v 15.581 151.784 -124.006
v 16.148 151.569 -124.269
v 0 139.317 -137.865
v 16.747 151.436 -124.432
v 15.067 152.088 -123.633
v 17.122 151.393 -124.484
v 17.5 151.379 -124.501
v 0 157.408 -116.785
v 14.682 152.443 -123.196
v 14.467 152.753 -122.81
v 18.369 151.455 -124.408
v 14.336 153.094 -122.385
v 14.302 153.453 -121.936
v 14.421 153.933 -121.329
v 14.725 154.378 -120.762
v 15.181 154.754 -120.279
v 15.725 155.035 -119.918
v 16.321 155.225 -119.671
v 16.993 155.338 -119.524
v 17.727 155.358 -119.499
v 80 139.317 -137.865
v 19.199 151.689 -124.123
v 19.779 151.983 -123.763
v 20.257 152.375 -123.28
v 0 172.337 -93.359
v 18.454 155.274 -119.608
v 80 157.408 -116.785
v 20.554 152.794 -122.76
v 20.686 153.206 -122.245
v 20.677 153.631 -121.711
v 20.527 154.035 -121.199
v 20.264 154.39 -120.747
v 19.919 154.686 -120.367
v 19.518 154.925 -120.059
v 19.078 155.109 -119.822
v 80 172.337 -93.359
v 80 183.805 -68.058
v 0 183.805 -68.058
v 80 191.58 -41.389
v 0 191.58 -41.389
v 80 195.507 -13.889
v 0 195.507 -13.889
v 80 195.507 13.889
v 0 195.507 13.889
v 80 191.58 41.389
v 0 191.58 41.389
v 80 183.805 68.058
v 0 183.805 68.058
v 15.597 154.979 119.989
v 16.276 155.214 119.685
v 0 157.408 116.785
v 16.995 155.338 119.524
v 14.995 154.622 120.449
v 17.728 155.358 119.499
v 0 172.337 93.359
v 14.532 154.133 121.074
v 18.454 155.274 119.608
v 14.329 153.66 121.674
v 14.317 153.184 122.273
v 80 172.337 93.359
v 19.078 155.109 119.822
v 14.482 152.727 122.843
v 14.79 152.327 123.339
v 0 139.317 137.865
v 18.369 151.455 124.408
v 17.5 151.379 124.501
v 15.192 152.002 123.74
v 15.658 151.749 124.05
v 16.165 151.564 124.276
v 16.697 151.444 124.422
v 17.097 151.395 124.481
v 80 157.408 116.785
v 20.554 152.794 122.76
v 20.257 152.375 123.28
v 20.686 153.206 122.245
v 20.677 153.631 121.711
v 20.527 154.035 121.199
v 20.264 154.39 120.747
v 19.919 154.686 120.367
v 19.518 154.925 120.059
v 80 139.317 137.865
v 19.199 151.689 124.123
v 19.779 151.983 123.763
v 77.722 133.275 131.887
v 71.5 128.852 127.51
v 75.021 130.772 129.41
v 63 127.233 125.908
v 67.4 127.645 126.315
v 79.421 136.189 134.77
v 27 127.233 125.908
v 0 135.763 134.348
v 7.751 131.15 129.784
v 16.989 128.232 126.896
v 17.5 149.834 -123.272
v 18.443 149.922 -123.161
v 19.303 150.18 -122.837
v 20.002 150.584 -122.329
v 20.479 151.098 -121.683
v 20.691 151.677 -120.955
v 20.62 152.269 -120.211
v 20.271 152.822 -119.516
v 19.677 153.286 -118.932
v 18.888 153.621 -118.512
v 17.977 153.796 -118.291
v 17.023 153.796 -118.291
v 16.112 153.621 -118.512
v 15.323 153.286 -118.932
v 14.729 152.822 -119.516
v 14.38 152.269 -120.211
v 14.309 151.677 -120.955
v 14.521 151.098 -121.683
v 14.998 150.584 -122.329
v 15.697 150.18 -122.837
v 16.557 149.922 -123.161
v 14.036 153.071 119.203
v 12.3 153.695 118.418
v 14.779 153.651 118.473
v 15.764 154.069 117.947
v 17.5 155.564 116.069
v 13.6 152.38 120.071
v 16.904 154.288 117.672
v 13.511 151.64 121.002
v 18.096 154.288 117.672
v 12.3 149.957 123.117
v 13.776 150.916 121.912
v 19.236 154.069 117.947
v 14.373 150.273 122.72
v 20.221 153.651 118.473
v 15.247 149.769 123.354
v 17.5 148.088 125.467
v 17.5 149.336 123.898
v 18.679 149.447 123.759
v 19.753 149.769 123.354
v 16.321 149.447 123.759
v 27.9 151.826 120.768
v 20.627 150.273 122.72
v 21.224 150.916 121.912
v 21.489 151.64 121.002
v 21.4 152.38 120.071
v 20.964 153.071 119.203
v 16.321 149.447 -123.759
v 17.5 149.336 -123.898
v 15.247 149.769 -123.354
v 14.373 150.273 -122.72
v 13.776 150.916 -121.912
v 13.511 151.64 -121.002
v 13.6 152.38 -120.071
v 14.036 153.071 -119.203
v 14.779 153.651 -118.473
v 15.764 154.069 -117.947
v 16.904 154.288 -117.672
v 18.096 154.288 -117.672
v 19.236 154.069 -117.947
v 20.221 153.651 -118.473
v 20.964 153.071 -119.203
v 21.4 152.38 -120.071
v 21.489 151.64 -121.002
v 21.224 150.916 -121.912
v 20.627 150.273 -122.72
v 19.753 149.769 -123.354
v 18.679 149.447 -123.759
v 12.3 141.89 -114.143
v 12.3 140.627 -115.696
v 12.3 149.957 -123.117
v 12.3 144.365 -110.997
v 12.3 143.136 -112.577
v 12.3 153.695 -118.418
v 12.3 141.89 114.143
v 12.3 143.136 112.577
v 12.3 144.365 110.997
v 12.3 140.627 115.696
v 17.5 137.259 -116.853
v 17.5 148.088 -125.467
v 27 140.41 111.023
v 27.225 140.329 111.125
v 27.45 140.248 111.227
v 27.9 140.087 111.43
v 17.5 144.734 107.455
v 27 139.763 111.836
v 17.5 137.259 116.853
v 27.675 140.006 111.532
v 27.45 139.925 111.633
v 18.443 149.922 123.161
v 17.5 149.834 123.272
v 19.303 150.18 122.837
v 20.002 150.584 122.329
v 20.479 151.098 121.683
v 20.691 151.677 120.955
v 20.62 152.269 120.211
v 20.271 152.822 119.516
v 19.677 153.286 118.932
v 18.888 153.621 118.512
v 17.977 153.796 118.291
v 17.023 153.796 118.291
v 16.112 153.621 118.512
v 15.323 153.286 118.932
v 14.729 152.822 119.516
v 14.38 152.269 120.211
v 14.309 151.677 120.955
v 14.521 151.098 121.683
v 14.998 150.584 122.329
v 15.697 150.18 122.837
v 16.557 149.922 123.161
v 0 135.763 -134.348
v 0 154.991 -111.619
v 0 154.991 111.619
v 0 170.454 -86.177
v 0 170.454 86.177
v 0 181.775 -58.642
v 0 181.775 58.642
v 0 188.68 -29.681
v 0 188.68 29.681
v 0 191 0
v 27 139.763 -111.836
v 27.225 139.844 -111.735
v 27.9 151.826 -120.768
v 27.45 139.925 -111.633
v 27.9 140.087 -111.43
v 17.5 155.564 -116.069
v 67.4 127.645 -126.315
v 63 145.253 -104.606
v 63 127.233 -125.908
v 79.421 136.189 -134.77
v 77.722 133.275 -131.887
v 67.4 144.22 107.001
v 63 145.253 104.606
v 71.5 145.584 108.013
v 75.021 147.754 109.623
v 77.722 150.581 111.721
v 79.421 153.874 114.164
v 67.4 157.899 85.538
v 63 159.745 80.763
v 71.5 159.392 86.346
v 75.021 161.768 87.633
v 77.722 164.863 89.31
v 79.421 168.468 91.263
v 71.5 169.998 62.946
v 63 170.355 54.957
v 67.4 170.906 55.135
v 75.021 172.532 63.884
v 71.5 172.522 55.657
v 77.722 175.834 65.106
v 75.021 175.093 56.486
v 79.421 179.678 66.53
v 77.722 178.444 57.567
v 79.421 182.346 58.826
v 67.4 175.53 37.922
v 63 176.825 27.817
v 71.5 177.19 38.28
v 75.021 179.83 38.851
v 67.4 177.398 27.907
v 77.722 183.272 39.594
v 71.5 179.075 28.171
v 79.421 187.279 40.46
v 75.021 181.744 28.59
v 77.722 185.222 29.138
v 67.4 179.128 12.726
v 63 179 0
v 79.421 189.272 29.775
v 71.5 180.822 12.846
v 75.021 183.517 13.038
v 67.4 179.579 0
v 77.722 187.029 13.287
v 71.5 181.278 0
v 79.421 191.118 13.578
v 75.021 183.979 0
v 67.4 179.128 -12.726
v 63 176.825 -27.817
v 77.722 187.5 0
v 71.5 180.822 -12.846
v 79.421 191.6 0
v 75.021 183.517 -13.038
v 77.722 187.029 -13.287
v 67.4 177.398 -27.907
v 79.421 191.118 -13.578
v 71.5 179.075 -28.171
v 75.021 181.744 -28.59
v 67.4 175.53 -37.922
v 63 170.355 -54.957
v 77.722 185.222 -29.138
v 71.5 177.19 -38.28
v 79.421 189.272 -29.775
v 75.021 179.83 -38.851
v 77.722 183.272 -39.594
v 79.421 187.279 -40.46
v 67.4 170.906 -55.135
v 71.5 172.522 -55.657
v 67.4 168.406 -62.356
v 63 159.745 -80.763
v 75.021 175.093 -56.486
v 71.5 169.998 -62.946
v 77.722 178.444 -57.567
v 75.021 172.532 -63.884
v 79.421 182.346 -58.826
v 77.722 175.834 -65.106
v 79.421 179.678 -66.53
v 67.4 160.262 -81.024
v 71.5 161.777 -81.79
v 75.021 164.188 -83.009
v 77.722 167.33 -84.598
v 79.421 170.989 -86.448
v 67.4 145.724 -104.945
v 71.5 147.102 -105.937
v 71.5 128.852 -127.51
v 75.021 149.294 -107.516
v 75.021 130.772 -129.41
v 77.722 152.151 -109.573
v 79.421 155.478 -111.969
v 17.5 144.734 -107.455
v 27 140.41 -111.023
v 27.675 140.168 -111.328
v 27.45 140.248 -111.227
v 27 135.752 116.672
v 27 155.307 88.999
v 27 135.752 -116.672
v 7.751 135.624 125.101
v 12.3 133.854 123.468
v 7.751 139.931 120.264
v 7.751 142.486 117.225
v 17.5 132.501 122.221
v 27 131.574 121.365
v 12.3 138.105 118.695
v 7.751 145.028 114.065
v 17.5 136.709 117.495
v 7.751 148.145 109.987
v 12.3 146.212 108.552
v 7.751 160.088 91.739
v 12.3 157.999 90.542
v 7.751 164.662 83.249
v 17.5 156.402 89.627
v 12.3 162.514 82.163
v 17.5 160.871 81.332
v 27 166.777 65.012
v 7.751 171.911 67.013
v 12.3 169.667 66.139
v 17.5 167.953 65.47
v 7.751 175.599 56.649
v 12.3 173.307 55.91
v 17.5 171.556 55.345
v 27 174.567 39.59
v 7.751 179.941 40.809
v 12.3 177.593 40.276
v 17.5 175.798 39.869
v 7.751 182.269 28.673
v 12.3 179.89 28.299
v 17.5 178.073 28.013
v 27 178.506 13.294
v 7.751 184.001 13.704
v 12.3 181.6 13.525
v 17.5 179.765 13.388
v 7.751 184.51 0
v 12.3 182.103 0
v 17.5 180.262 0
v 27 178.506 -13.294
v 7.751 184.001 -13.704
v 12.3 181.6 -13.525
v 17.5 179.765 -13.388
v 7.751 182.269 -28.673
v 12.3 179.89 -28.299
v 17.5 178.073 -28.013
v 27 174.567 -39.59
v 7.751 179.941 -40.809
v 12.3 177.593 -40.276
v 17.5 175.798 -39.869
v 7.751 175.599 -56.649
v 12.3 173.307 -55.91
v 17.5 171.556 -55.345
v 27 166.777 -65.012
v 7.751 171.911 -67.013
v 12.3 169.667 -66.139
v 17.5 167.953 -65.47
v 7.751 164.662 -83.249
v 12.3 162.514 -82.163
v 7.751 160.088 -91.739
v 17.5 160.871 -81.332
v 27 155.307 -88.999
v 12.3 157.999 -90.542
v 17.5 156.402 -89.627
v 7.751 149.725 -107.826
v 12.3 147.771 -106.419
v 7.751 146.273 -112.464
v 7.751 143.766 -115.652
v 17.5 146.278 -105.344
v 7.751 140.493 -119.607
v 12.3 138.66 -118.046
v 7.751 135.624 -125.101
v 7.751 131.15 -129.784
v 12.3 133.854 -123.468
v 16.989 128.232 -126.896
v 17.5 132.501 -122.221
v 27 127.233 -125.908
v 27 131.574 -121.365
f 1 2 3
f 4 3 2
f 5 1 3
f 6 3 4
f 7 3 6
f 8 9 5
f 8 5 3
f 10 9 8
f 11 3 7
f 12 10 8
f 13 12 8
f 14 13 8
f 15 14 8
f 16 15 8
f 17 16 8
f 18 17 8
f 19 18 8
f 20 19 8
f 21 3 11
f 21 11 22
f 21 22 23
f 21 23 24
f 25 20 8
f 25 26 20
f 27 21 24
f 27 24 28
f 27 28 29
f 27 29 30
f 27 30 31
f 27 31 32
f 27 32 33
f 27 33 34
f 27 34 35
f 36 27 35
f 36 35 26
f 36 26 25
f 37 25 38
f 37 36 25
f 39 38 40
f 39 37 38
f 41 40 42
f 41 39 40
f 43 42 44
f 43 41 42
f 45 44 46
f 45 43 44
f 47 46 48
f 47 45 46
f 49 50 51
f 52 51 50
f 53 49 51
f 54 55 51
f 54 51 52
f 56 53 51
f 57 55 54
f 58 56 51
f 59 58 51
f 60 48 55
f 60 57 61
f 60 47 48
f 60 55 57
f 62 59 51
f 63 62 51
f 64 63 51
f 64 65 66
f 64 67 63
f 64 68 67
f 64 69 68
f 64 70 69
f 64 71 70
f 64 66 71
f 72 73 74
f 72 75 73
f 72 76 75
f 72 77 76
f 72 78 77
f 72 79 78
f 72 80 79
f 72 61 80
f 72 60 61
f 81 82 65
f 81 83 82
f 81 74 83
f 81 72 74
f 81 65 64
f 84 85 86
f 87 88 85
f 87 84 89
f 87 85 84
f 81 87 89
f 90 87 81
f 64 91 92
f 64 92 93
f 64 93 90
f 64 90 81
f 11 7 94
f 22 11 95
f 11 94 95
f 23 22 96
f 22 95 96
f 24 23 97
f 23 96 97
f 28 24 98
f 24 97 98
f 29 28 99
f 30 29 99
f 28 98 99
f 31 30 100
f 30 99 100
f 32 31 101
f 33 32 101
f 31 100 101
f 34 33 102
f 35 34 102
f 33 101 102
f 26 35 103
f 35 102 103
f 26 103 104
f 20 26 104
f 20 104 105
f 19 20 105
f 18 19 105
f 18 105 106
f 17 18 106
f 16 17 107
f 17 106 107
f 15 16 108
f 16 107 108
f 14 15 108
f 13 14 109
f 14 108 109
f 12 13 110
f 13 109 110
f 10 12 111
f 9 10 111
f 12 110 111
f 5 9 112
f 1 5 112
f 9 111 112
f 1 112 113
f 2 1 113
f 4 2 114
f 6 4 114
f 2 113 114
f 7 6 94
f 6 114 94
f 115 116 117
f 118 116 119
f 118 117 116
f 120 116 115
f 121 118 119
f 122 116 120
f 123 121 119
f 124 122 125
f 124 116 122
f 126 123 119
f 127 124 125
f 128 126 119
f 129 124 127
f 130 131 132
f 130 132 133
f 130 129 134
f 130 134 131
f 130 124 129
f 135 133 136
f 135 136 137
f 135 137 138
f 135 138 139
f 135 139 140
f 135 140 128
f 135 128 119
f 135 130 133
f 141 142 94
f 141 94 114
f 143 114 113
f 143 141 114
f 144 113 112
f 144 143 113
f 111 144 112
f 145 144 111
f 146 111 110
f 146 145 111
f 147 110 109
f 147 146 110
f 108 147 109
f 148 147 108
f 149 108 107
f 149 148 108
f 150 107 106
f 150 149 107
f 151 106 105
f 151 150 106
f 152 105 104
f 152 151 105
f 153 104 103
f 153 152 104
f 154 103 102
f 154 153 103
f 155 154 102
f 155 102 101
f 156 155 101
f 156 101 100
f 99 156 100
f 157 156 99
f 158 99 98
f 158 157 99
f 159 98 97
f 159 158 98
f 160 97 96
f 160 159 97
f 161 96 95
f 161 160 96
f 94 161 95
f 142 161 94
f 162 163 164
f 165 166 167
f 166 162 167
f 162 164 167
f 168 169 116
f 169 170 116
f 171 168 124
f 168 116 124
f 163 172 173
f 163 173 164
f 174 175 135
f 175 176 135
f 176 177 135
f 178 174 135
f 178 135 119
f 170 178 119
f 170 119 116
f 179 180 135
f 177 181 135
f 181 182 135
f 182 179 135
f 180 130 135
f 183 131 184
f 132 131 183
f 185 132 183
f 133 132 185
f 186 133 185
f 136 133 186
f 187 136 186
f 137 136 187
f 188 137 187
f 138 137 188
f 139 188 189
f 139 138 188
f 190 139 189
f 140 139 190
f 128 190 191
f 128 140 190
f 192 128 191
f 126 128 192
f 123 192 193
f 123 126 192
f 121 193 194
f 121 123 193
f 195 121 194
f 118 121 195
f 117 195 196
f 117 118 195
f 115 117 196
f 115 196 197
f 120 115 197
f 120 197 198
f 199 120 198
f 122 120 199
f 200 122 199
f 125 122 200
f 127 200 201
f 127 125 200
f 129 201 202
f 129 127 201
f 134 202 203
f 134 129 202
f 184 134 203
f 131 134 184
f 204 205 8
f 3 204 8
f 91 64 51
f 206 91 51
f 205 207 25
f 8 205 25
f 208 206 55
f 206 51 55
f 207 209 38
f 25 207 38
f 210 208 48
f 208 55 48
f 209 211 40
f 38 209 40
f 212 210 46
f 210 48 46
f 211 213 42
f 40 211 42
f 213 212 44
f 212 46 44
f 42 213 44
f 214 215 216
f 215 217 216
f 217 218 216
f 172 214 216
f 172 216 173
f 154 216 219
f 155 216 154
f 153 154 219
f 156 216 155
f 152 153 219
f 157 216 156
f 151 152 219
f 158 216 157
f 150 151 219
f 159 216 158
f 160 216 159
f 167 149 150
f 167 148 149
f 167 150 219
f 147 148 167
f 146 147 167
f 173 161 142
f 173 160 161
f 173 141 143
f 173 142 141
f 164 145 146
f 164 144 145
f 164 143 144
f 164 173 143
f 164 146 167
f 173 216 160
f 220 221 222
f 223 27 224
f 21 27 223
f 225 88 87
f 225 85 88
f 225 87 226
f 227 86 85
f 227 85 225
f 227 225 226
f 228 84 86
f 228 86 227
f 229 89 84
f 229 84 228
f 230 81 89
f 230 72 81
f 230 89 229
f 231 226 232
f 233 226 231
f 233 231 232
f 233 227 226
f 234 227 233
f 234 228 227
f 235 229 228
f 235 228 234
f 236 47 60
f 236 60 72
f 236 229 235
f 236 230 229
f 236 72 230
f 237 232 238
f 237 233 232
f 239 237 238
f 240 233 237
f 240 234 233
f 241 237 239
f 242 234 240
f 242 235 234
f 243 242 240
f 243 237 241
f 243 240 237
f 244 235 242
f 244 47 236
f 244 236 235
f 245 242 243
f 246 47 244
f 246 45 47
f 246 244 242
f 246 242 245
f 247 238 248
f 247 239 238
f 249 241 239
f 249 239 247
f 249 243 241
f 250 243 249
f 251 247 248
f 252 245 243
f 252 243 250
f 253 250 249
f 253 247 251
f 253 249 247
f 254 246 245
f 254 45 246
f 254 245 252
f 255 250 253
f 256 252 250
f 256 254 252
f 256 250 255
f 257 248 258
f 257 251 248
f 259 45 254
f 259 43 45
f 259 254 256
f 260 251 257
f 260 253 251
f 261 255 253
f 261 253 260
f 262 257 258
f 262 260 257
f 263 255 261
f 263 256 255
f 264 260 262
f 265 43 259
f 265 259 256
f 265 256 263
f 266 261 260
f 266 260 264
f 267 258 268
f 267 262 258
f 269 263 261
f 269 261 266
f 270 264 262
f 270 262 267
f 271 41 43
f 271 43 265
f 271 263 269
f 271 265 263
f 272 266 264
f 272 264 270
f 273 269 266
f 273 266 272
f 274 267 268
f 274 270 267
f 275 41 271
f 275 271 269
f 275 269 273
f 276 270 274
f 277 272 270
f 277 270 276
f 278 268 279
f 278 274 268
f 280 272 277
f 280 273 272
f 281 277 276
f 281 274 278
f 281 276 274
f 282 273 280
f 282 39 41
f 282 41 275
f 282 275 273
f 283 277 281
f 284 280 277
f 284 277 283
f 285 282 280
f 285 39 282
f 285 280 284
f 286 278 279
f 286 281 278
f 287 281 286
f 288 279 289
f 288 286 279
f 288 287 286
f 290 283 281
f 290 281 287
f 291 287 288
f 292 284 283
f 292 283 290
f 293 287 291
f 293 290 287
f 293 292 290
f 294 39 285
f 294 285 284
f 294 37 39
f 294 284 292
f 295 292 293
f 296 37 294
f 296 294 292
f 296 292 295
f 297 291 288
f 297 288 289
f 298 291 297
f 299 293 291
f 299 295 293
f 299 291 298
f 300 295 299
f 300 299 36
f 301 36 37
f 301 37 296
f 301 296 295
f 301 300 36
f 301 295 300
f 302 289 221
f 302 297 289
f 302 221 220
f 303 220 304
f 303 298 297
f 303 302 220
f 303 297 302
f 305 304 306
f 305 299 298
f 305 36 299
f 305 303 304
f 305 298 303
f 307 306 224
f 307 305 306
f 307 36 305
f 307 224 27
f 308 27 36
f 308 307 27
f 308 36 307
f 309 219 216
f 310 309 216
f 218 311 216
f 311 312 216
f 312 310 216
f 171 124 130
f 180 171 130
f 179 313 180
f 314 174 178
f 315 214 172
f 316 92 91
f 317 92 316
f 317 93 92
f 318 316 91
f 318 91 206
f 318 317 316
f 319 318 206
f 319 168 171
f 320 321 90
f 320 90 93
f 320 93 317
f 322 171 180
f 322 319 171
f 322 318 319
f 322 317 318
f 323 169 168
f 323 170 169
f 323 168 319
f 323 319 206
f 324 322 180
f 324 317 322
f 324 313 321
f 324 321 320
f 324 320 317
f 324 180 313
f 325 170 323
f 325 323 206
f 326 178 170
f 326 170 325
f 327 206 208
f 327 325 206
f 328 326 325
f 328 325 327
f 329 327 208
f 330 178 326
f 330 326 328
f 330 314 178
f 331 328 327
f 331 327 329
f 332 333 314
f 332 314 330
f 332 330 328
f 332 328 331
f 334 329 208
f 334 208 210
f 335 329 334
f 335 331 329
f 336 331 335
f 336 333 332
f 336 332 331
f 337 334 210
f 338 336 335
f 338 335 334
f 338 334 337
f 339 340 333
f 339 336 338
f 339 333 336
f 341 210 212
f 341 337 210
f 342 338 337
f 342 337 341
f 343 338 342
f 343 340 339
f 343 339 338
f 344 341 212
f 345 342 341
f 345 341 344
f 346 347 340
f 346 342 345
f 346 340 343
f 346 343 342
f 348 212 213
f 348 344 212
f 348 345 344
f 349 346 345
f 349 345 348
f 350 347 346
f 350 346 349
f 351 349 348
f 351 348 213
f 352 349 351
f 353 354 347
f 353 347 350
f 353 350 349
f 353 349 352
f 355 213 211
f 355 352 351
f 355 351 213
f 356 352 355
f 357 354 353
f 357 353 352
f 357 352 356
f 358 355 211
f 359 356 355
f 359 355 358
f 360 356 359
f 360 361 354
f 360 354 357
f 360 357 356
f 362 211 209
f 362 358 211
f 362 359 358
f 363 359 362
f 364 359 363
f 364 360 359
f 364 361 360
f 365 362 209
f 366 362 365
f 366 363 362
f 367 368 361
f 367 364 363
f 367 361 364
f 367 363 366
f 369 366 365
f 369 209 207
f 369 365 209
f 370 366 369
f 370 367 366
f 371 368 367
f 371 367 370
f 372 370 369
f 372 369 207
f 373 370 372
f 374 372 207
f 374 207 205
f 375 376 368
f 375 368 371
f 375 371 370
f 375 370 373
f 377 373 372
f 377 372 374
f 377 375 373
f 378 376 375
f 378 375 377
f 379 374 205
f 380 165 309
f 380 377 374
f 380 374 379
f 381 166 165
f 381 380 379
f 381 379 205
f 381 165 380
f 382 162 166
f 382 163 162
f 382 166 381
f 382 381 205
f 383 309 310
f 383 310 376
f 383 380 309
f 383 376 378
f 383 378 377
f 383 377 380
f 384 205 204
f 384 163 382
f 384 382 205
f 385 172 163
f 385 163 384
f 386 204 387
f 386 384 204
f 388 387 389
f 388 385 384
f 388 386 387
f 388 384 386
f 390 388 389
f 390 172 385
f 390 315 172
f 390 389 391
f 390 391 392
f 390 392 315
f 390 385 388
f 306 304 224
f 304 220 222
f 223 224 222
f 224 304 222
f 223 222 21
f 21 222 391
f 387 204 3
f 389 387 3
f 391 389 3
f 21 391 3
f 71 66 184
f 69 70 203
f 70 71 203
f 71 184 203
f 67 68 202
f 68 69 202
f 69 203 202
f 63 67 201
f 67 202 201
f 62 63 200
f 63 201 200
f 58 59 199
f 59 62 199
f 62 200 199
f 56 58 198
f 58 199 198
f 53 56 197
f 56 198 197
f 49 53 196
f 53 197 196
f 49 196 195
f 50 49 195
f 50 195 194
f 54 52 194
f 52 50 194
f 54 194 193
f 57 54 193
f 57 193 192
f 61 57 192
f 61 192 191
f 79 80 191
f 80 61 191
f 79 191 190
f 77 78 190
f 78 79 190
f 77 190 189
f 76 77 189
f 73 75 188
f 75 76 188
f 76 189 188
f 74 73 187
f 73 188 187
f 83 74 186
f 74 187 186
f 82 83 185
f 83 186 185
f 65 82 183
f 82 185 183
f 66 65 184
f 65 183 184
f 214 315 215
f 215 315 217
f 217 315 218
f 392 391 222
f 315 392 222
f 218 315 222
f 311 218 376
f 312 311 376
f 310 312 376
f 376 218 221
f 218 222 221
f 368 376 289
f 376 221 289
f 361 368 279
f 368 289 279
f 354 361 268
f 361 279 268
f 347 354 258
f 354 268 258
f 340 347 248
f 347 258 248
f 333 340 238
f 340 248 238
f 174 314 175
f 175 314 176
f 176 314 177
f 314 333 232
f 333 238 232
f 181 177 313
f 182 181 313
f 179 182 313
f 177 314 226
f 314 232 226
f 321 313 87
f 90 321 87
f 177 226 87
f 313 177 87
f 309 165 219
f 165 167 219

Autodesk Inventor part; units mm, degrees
ref_plane "XY Plane" through (0, 0, 0) normal (0, 0, 1) x (1, 0, 0)
sketch "Skizze6" plane through (0, 0, 0) normal (0, 0, 1) x (0, 1, 0)
  line L0 (0, 181.4954) -> (0, -165.4211)
  line L1 (196, 0) -> (196, -80)
  line L2 (179, -27) -> (179, -63)
  arc A0 (191, 0) -> (179, -27) centre (215.375, -27) ccw
  arc A1 (179, -63) -> (196, -80) centre (196, -63) ccw
  line L3 (191, 0) -> (196, 0)
  line L4 (258.45, 0) -> (-43.075, 0) projected
  point P0 (0, 0)
  dimension "d29" = 80
  dimension "d30" = 392
  dimension "d31" = 358
  dimension "d32" = 5
  dimension "d35" = 27
revolve "Umdrehung1" add sketch "Skizze6" angle 89.4 mid plane about axis through (-181.4954, 0, 0) along (1, 0, 0)
ref_plane "Arbeitsebene1" through (17.5, 0, 0) normal (1, 0, 0) x (0, 1, 0)
sketch "Skizze7" plane through (17.5, 0, 0) normal (1, 0, 0) x (0, 1, 0)
  line L0 (0, 0) -> (200, 159.0872)
  line L1 (-40, 0) -> (240, 0) projected
  arc A0 (139.3167, -137.8654) -> (139.3167, 137.8654) centre (0, 0) ccw projected
  line L2 (153.3912, 122.0129) -> (151.3992, 124.5172)
  line L3 (151.3992, 124.5172) -> (149.8339, 123.2722)
  line L4 (149.8339, 123.2722) -> (149.3359, 123.8983)
  line L5 (149.3359, 123.8983) -> (137.5618, 114.5327)
  arc A1 (127.2331, -125.9077) -> (127.2331, 125.9077) centre (0, 0) ccw projected
  line L6 (137.5618, 114.5327) -> (140.0519, 111.4023)
  arc A2 (139.3167, -137.8654) -> (139.3167, 137.8654) centre (0, 0) ccw projected
  point P0 (140.0869, 111.4301)
  point P1 (151.3787, 124.501)
  point P2 (153.3912, 122.0129)
  point P3 (153.3912, 122.0129)
  dimension "d37" = 38.5
  dimension "d38" = 200
  dimension "d39" = 6.4
  dimension "d40" = 8
  dimension "d41" = 2
revolve "Umdrehung2" cut sketch "Skizze7" angle 360 about axis through (17.5, 0, 0) along (0, 0.7826082, 0.6225146) contours A1 L5 L4 L3 A0 L0 | A0 L3 L2
sketch "Skizze8" plane through (17.5, 151.826, 120.7678) normal (0, -0.7826082, -0.6225146) x (1, 0, 0)
  line L0 (-5.2, -3.0022) -> (-5.2, 3.0022)
  line L1 (-5.2, 3.0022) -> (0, 6.0044)
  line L2 (0, 6.0044) -> (5.2, 3.0022)
  line L3 (5.2, 3.0022) -> (5.2, -3.0022)
  line L4 (5.2, -3.0022) -> (0, -6.0044)
  line L5 (0, -6.0044) -> (-5.2, -3.0022)
  line L6 (0, 80.4096) -> (0, -281.6269) projected
  circle A0 centre (0, 0) radius 3.2 projected
  line L7 (5.2, 3.0022) -> (10.4, 0)
  line L8 (10.4, 0) -> (5.2, -3.0022)
  point P0 (-17.5, 0)
  point P1 (0, 0)
  dimension "d43" = 10.4
extrude "Extrusion6" cut sketch "Skizze8" along normal through all contours L0 L1 L6 A0 L5 | L6 A0 L2 L3 L4 | L3 L7 L8
mirror "Spiegeln2" about plane through (0, 0, 0) normal (0, 0, 1) of "Extrusion6", "Umdrehung2"
ref_plane "Arbeitsebene3" through (40, 196, 0) normal (0, 1, 0) x (-1, 0, 0)
properties part number "Ventilator_Flansch_Oben"
